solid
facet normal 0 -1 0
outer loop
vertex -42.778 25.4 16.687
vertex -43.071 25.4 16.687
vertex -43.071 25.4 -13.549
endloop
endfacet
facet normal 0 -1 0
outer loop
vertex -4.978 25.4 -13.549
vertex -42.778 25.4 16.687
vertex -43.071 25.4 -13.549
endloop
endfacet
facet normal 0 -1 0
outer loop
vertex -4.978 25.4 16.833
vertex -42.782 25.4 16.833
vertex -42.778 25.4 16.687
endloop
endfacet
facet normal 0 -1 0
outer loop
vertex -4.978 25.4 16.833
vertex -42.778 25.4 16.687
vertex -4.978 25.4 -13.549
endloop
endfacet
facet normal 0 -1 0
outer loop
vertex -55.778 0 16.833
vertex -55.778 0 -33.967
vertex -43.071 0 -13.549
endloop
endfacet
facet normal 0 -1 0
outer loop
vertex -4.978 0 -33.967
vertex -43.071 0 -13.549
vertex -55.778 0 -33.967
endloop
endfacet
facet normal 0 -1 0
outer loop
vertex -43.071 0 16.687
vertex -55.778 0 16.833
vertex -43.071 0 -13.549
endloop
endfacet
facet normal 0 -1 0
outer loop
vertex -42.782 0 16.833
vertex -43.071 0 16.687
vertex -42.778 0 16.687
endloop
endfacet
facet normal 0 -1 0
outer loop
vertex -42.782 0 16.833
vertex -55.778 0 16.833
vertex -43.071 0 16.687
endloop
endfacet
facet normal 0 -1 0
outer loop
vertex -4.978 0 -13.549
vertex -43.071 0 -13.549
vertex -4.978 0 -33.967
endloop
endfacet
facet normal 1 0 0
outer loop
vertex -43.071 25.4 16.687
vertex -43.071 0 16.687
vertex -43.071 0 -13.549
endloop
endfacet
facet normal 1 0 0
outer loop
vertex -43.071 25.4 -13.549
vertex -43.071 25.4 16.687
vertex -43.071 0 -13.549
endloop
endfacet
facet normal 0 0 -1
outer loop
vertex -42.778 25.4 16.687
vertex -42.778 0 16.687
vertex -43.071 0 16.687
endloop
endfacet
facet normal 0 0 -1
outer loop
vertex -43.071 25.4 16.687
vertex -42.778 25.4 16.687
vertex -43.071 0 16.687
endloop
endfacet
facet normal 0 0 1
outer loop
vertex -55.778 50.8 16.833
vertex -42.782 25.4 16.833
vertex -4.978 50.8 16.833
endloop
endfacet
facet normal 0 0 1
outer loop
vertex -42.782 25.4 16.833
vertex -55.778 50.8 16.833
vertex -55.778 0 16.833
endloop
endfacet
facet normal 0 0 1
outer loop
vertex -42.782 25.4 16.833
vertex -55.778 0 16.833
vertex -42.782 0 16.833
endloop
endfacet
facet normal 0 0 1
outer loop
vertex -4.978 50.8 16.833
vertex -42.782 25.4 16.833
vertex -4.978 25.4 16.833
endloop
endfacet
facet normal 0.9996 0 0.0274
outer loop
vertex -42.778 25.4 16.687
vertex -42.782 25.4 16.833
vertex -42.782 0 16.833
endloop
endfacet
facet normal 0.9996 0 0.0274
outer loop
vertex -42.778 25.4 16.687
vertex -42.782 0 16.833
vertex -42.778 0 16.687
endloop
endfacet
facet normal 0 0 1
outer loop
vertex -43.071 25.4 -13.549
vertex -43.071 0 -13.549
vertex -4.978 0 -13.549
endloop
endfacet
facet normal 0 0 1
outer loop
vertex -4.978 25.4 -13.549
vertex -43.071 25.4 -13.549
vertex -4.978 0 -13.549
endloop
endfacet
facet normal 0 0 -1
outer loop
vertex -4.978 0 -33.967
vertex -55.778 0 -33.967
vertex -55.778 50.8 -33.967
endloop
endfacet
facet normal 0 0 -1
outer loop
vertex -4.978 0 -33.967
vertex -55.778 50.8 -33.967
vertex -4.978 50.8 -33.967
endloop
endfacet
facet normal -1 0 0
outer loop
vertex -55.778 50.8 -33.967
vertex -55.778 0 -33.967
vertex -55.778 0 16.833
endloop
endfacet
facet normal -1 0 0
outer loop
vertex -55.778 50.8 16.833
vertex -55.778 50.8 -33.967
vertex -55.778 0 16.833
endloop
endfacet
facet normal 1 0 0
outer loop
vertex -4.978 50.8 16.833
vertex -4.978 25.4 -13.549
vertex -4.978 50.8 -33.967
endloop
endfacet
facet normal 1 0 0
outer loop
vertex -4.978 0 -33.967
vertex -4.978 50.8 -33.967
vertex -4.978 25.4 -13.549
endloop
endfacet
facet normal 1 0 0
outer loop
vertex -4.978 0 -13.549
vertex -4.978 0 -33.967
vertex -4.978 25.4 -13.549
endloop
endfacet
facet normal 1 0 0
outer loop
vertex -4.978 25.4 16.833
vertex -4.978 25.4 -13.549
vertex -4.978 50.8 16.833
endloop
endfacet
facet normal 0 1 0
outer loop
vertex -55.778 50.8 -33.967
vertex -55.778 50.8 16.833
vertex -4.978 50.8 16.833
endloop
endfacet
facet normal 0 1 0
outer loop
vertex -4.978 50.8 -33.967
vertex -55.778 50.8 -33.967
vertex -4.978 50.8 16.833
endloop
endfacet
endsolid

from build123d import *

# Parameters (mm, degrees)
F0_W     = 50.8
F0_H     = 50.8
F1_DEPTH = 50.8
F3_DEPTH = 25.4
F5_DEPTH = 25.4


with BuildPart() as f1:
    # F0 (on Front) → F1 (new body)
    with BuildSketch(Plane.XZ):
        with Locations((-30.37813, -8.567312)):
            Rectangle(F0_W, F0_H)
    extrude(amount=-F1_DEPTH)

    # F2 (on Front) → F3 (cut)
    with BuildSketch(Plane.XZ):
        Polygon((-43.071337, -13.54893), (-4.849092, -13.54893), (-5.134332, 16.686577), (-43.071337, 16.686577), align=None)
    extrude(amount=-F3_DEPTH, mode=Mode.SUBTRACT)

    # F4 (on Front) → F5 (cut)
    with BuildSketch(Plane.XZ):
        Polygon((-4.563851, 16.971819), (-42.786095, 16.971819), (-41.930374, -12.122728), (-4.563851, -12.122728), align=None)
    extrude(amount=-F5_DEPTH, mode=Mode.SUBTRACT)


solid = f1.part
